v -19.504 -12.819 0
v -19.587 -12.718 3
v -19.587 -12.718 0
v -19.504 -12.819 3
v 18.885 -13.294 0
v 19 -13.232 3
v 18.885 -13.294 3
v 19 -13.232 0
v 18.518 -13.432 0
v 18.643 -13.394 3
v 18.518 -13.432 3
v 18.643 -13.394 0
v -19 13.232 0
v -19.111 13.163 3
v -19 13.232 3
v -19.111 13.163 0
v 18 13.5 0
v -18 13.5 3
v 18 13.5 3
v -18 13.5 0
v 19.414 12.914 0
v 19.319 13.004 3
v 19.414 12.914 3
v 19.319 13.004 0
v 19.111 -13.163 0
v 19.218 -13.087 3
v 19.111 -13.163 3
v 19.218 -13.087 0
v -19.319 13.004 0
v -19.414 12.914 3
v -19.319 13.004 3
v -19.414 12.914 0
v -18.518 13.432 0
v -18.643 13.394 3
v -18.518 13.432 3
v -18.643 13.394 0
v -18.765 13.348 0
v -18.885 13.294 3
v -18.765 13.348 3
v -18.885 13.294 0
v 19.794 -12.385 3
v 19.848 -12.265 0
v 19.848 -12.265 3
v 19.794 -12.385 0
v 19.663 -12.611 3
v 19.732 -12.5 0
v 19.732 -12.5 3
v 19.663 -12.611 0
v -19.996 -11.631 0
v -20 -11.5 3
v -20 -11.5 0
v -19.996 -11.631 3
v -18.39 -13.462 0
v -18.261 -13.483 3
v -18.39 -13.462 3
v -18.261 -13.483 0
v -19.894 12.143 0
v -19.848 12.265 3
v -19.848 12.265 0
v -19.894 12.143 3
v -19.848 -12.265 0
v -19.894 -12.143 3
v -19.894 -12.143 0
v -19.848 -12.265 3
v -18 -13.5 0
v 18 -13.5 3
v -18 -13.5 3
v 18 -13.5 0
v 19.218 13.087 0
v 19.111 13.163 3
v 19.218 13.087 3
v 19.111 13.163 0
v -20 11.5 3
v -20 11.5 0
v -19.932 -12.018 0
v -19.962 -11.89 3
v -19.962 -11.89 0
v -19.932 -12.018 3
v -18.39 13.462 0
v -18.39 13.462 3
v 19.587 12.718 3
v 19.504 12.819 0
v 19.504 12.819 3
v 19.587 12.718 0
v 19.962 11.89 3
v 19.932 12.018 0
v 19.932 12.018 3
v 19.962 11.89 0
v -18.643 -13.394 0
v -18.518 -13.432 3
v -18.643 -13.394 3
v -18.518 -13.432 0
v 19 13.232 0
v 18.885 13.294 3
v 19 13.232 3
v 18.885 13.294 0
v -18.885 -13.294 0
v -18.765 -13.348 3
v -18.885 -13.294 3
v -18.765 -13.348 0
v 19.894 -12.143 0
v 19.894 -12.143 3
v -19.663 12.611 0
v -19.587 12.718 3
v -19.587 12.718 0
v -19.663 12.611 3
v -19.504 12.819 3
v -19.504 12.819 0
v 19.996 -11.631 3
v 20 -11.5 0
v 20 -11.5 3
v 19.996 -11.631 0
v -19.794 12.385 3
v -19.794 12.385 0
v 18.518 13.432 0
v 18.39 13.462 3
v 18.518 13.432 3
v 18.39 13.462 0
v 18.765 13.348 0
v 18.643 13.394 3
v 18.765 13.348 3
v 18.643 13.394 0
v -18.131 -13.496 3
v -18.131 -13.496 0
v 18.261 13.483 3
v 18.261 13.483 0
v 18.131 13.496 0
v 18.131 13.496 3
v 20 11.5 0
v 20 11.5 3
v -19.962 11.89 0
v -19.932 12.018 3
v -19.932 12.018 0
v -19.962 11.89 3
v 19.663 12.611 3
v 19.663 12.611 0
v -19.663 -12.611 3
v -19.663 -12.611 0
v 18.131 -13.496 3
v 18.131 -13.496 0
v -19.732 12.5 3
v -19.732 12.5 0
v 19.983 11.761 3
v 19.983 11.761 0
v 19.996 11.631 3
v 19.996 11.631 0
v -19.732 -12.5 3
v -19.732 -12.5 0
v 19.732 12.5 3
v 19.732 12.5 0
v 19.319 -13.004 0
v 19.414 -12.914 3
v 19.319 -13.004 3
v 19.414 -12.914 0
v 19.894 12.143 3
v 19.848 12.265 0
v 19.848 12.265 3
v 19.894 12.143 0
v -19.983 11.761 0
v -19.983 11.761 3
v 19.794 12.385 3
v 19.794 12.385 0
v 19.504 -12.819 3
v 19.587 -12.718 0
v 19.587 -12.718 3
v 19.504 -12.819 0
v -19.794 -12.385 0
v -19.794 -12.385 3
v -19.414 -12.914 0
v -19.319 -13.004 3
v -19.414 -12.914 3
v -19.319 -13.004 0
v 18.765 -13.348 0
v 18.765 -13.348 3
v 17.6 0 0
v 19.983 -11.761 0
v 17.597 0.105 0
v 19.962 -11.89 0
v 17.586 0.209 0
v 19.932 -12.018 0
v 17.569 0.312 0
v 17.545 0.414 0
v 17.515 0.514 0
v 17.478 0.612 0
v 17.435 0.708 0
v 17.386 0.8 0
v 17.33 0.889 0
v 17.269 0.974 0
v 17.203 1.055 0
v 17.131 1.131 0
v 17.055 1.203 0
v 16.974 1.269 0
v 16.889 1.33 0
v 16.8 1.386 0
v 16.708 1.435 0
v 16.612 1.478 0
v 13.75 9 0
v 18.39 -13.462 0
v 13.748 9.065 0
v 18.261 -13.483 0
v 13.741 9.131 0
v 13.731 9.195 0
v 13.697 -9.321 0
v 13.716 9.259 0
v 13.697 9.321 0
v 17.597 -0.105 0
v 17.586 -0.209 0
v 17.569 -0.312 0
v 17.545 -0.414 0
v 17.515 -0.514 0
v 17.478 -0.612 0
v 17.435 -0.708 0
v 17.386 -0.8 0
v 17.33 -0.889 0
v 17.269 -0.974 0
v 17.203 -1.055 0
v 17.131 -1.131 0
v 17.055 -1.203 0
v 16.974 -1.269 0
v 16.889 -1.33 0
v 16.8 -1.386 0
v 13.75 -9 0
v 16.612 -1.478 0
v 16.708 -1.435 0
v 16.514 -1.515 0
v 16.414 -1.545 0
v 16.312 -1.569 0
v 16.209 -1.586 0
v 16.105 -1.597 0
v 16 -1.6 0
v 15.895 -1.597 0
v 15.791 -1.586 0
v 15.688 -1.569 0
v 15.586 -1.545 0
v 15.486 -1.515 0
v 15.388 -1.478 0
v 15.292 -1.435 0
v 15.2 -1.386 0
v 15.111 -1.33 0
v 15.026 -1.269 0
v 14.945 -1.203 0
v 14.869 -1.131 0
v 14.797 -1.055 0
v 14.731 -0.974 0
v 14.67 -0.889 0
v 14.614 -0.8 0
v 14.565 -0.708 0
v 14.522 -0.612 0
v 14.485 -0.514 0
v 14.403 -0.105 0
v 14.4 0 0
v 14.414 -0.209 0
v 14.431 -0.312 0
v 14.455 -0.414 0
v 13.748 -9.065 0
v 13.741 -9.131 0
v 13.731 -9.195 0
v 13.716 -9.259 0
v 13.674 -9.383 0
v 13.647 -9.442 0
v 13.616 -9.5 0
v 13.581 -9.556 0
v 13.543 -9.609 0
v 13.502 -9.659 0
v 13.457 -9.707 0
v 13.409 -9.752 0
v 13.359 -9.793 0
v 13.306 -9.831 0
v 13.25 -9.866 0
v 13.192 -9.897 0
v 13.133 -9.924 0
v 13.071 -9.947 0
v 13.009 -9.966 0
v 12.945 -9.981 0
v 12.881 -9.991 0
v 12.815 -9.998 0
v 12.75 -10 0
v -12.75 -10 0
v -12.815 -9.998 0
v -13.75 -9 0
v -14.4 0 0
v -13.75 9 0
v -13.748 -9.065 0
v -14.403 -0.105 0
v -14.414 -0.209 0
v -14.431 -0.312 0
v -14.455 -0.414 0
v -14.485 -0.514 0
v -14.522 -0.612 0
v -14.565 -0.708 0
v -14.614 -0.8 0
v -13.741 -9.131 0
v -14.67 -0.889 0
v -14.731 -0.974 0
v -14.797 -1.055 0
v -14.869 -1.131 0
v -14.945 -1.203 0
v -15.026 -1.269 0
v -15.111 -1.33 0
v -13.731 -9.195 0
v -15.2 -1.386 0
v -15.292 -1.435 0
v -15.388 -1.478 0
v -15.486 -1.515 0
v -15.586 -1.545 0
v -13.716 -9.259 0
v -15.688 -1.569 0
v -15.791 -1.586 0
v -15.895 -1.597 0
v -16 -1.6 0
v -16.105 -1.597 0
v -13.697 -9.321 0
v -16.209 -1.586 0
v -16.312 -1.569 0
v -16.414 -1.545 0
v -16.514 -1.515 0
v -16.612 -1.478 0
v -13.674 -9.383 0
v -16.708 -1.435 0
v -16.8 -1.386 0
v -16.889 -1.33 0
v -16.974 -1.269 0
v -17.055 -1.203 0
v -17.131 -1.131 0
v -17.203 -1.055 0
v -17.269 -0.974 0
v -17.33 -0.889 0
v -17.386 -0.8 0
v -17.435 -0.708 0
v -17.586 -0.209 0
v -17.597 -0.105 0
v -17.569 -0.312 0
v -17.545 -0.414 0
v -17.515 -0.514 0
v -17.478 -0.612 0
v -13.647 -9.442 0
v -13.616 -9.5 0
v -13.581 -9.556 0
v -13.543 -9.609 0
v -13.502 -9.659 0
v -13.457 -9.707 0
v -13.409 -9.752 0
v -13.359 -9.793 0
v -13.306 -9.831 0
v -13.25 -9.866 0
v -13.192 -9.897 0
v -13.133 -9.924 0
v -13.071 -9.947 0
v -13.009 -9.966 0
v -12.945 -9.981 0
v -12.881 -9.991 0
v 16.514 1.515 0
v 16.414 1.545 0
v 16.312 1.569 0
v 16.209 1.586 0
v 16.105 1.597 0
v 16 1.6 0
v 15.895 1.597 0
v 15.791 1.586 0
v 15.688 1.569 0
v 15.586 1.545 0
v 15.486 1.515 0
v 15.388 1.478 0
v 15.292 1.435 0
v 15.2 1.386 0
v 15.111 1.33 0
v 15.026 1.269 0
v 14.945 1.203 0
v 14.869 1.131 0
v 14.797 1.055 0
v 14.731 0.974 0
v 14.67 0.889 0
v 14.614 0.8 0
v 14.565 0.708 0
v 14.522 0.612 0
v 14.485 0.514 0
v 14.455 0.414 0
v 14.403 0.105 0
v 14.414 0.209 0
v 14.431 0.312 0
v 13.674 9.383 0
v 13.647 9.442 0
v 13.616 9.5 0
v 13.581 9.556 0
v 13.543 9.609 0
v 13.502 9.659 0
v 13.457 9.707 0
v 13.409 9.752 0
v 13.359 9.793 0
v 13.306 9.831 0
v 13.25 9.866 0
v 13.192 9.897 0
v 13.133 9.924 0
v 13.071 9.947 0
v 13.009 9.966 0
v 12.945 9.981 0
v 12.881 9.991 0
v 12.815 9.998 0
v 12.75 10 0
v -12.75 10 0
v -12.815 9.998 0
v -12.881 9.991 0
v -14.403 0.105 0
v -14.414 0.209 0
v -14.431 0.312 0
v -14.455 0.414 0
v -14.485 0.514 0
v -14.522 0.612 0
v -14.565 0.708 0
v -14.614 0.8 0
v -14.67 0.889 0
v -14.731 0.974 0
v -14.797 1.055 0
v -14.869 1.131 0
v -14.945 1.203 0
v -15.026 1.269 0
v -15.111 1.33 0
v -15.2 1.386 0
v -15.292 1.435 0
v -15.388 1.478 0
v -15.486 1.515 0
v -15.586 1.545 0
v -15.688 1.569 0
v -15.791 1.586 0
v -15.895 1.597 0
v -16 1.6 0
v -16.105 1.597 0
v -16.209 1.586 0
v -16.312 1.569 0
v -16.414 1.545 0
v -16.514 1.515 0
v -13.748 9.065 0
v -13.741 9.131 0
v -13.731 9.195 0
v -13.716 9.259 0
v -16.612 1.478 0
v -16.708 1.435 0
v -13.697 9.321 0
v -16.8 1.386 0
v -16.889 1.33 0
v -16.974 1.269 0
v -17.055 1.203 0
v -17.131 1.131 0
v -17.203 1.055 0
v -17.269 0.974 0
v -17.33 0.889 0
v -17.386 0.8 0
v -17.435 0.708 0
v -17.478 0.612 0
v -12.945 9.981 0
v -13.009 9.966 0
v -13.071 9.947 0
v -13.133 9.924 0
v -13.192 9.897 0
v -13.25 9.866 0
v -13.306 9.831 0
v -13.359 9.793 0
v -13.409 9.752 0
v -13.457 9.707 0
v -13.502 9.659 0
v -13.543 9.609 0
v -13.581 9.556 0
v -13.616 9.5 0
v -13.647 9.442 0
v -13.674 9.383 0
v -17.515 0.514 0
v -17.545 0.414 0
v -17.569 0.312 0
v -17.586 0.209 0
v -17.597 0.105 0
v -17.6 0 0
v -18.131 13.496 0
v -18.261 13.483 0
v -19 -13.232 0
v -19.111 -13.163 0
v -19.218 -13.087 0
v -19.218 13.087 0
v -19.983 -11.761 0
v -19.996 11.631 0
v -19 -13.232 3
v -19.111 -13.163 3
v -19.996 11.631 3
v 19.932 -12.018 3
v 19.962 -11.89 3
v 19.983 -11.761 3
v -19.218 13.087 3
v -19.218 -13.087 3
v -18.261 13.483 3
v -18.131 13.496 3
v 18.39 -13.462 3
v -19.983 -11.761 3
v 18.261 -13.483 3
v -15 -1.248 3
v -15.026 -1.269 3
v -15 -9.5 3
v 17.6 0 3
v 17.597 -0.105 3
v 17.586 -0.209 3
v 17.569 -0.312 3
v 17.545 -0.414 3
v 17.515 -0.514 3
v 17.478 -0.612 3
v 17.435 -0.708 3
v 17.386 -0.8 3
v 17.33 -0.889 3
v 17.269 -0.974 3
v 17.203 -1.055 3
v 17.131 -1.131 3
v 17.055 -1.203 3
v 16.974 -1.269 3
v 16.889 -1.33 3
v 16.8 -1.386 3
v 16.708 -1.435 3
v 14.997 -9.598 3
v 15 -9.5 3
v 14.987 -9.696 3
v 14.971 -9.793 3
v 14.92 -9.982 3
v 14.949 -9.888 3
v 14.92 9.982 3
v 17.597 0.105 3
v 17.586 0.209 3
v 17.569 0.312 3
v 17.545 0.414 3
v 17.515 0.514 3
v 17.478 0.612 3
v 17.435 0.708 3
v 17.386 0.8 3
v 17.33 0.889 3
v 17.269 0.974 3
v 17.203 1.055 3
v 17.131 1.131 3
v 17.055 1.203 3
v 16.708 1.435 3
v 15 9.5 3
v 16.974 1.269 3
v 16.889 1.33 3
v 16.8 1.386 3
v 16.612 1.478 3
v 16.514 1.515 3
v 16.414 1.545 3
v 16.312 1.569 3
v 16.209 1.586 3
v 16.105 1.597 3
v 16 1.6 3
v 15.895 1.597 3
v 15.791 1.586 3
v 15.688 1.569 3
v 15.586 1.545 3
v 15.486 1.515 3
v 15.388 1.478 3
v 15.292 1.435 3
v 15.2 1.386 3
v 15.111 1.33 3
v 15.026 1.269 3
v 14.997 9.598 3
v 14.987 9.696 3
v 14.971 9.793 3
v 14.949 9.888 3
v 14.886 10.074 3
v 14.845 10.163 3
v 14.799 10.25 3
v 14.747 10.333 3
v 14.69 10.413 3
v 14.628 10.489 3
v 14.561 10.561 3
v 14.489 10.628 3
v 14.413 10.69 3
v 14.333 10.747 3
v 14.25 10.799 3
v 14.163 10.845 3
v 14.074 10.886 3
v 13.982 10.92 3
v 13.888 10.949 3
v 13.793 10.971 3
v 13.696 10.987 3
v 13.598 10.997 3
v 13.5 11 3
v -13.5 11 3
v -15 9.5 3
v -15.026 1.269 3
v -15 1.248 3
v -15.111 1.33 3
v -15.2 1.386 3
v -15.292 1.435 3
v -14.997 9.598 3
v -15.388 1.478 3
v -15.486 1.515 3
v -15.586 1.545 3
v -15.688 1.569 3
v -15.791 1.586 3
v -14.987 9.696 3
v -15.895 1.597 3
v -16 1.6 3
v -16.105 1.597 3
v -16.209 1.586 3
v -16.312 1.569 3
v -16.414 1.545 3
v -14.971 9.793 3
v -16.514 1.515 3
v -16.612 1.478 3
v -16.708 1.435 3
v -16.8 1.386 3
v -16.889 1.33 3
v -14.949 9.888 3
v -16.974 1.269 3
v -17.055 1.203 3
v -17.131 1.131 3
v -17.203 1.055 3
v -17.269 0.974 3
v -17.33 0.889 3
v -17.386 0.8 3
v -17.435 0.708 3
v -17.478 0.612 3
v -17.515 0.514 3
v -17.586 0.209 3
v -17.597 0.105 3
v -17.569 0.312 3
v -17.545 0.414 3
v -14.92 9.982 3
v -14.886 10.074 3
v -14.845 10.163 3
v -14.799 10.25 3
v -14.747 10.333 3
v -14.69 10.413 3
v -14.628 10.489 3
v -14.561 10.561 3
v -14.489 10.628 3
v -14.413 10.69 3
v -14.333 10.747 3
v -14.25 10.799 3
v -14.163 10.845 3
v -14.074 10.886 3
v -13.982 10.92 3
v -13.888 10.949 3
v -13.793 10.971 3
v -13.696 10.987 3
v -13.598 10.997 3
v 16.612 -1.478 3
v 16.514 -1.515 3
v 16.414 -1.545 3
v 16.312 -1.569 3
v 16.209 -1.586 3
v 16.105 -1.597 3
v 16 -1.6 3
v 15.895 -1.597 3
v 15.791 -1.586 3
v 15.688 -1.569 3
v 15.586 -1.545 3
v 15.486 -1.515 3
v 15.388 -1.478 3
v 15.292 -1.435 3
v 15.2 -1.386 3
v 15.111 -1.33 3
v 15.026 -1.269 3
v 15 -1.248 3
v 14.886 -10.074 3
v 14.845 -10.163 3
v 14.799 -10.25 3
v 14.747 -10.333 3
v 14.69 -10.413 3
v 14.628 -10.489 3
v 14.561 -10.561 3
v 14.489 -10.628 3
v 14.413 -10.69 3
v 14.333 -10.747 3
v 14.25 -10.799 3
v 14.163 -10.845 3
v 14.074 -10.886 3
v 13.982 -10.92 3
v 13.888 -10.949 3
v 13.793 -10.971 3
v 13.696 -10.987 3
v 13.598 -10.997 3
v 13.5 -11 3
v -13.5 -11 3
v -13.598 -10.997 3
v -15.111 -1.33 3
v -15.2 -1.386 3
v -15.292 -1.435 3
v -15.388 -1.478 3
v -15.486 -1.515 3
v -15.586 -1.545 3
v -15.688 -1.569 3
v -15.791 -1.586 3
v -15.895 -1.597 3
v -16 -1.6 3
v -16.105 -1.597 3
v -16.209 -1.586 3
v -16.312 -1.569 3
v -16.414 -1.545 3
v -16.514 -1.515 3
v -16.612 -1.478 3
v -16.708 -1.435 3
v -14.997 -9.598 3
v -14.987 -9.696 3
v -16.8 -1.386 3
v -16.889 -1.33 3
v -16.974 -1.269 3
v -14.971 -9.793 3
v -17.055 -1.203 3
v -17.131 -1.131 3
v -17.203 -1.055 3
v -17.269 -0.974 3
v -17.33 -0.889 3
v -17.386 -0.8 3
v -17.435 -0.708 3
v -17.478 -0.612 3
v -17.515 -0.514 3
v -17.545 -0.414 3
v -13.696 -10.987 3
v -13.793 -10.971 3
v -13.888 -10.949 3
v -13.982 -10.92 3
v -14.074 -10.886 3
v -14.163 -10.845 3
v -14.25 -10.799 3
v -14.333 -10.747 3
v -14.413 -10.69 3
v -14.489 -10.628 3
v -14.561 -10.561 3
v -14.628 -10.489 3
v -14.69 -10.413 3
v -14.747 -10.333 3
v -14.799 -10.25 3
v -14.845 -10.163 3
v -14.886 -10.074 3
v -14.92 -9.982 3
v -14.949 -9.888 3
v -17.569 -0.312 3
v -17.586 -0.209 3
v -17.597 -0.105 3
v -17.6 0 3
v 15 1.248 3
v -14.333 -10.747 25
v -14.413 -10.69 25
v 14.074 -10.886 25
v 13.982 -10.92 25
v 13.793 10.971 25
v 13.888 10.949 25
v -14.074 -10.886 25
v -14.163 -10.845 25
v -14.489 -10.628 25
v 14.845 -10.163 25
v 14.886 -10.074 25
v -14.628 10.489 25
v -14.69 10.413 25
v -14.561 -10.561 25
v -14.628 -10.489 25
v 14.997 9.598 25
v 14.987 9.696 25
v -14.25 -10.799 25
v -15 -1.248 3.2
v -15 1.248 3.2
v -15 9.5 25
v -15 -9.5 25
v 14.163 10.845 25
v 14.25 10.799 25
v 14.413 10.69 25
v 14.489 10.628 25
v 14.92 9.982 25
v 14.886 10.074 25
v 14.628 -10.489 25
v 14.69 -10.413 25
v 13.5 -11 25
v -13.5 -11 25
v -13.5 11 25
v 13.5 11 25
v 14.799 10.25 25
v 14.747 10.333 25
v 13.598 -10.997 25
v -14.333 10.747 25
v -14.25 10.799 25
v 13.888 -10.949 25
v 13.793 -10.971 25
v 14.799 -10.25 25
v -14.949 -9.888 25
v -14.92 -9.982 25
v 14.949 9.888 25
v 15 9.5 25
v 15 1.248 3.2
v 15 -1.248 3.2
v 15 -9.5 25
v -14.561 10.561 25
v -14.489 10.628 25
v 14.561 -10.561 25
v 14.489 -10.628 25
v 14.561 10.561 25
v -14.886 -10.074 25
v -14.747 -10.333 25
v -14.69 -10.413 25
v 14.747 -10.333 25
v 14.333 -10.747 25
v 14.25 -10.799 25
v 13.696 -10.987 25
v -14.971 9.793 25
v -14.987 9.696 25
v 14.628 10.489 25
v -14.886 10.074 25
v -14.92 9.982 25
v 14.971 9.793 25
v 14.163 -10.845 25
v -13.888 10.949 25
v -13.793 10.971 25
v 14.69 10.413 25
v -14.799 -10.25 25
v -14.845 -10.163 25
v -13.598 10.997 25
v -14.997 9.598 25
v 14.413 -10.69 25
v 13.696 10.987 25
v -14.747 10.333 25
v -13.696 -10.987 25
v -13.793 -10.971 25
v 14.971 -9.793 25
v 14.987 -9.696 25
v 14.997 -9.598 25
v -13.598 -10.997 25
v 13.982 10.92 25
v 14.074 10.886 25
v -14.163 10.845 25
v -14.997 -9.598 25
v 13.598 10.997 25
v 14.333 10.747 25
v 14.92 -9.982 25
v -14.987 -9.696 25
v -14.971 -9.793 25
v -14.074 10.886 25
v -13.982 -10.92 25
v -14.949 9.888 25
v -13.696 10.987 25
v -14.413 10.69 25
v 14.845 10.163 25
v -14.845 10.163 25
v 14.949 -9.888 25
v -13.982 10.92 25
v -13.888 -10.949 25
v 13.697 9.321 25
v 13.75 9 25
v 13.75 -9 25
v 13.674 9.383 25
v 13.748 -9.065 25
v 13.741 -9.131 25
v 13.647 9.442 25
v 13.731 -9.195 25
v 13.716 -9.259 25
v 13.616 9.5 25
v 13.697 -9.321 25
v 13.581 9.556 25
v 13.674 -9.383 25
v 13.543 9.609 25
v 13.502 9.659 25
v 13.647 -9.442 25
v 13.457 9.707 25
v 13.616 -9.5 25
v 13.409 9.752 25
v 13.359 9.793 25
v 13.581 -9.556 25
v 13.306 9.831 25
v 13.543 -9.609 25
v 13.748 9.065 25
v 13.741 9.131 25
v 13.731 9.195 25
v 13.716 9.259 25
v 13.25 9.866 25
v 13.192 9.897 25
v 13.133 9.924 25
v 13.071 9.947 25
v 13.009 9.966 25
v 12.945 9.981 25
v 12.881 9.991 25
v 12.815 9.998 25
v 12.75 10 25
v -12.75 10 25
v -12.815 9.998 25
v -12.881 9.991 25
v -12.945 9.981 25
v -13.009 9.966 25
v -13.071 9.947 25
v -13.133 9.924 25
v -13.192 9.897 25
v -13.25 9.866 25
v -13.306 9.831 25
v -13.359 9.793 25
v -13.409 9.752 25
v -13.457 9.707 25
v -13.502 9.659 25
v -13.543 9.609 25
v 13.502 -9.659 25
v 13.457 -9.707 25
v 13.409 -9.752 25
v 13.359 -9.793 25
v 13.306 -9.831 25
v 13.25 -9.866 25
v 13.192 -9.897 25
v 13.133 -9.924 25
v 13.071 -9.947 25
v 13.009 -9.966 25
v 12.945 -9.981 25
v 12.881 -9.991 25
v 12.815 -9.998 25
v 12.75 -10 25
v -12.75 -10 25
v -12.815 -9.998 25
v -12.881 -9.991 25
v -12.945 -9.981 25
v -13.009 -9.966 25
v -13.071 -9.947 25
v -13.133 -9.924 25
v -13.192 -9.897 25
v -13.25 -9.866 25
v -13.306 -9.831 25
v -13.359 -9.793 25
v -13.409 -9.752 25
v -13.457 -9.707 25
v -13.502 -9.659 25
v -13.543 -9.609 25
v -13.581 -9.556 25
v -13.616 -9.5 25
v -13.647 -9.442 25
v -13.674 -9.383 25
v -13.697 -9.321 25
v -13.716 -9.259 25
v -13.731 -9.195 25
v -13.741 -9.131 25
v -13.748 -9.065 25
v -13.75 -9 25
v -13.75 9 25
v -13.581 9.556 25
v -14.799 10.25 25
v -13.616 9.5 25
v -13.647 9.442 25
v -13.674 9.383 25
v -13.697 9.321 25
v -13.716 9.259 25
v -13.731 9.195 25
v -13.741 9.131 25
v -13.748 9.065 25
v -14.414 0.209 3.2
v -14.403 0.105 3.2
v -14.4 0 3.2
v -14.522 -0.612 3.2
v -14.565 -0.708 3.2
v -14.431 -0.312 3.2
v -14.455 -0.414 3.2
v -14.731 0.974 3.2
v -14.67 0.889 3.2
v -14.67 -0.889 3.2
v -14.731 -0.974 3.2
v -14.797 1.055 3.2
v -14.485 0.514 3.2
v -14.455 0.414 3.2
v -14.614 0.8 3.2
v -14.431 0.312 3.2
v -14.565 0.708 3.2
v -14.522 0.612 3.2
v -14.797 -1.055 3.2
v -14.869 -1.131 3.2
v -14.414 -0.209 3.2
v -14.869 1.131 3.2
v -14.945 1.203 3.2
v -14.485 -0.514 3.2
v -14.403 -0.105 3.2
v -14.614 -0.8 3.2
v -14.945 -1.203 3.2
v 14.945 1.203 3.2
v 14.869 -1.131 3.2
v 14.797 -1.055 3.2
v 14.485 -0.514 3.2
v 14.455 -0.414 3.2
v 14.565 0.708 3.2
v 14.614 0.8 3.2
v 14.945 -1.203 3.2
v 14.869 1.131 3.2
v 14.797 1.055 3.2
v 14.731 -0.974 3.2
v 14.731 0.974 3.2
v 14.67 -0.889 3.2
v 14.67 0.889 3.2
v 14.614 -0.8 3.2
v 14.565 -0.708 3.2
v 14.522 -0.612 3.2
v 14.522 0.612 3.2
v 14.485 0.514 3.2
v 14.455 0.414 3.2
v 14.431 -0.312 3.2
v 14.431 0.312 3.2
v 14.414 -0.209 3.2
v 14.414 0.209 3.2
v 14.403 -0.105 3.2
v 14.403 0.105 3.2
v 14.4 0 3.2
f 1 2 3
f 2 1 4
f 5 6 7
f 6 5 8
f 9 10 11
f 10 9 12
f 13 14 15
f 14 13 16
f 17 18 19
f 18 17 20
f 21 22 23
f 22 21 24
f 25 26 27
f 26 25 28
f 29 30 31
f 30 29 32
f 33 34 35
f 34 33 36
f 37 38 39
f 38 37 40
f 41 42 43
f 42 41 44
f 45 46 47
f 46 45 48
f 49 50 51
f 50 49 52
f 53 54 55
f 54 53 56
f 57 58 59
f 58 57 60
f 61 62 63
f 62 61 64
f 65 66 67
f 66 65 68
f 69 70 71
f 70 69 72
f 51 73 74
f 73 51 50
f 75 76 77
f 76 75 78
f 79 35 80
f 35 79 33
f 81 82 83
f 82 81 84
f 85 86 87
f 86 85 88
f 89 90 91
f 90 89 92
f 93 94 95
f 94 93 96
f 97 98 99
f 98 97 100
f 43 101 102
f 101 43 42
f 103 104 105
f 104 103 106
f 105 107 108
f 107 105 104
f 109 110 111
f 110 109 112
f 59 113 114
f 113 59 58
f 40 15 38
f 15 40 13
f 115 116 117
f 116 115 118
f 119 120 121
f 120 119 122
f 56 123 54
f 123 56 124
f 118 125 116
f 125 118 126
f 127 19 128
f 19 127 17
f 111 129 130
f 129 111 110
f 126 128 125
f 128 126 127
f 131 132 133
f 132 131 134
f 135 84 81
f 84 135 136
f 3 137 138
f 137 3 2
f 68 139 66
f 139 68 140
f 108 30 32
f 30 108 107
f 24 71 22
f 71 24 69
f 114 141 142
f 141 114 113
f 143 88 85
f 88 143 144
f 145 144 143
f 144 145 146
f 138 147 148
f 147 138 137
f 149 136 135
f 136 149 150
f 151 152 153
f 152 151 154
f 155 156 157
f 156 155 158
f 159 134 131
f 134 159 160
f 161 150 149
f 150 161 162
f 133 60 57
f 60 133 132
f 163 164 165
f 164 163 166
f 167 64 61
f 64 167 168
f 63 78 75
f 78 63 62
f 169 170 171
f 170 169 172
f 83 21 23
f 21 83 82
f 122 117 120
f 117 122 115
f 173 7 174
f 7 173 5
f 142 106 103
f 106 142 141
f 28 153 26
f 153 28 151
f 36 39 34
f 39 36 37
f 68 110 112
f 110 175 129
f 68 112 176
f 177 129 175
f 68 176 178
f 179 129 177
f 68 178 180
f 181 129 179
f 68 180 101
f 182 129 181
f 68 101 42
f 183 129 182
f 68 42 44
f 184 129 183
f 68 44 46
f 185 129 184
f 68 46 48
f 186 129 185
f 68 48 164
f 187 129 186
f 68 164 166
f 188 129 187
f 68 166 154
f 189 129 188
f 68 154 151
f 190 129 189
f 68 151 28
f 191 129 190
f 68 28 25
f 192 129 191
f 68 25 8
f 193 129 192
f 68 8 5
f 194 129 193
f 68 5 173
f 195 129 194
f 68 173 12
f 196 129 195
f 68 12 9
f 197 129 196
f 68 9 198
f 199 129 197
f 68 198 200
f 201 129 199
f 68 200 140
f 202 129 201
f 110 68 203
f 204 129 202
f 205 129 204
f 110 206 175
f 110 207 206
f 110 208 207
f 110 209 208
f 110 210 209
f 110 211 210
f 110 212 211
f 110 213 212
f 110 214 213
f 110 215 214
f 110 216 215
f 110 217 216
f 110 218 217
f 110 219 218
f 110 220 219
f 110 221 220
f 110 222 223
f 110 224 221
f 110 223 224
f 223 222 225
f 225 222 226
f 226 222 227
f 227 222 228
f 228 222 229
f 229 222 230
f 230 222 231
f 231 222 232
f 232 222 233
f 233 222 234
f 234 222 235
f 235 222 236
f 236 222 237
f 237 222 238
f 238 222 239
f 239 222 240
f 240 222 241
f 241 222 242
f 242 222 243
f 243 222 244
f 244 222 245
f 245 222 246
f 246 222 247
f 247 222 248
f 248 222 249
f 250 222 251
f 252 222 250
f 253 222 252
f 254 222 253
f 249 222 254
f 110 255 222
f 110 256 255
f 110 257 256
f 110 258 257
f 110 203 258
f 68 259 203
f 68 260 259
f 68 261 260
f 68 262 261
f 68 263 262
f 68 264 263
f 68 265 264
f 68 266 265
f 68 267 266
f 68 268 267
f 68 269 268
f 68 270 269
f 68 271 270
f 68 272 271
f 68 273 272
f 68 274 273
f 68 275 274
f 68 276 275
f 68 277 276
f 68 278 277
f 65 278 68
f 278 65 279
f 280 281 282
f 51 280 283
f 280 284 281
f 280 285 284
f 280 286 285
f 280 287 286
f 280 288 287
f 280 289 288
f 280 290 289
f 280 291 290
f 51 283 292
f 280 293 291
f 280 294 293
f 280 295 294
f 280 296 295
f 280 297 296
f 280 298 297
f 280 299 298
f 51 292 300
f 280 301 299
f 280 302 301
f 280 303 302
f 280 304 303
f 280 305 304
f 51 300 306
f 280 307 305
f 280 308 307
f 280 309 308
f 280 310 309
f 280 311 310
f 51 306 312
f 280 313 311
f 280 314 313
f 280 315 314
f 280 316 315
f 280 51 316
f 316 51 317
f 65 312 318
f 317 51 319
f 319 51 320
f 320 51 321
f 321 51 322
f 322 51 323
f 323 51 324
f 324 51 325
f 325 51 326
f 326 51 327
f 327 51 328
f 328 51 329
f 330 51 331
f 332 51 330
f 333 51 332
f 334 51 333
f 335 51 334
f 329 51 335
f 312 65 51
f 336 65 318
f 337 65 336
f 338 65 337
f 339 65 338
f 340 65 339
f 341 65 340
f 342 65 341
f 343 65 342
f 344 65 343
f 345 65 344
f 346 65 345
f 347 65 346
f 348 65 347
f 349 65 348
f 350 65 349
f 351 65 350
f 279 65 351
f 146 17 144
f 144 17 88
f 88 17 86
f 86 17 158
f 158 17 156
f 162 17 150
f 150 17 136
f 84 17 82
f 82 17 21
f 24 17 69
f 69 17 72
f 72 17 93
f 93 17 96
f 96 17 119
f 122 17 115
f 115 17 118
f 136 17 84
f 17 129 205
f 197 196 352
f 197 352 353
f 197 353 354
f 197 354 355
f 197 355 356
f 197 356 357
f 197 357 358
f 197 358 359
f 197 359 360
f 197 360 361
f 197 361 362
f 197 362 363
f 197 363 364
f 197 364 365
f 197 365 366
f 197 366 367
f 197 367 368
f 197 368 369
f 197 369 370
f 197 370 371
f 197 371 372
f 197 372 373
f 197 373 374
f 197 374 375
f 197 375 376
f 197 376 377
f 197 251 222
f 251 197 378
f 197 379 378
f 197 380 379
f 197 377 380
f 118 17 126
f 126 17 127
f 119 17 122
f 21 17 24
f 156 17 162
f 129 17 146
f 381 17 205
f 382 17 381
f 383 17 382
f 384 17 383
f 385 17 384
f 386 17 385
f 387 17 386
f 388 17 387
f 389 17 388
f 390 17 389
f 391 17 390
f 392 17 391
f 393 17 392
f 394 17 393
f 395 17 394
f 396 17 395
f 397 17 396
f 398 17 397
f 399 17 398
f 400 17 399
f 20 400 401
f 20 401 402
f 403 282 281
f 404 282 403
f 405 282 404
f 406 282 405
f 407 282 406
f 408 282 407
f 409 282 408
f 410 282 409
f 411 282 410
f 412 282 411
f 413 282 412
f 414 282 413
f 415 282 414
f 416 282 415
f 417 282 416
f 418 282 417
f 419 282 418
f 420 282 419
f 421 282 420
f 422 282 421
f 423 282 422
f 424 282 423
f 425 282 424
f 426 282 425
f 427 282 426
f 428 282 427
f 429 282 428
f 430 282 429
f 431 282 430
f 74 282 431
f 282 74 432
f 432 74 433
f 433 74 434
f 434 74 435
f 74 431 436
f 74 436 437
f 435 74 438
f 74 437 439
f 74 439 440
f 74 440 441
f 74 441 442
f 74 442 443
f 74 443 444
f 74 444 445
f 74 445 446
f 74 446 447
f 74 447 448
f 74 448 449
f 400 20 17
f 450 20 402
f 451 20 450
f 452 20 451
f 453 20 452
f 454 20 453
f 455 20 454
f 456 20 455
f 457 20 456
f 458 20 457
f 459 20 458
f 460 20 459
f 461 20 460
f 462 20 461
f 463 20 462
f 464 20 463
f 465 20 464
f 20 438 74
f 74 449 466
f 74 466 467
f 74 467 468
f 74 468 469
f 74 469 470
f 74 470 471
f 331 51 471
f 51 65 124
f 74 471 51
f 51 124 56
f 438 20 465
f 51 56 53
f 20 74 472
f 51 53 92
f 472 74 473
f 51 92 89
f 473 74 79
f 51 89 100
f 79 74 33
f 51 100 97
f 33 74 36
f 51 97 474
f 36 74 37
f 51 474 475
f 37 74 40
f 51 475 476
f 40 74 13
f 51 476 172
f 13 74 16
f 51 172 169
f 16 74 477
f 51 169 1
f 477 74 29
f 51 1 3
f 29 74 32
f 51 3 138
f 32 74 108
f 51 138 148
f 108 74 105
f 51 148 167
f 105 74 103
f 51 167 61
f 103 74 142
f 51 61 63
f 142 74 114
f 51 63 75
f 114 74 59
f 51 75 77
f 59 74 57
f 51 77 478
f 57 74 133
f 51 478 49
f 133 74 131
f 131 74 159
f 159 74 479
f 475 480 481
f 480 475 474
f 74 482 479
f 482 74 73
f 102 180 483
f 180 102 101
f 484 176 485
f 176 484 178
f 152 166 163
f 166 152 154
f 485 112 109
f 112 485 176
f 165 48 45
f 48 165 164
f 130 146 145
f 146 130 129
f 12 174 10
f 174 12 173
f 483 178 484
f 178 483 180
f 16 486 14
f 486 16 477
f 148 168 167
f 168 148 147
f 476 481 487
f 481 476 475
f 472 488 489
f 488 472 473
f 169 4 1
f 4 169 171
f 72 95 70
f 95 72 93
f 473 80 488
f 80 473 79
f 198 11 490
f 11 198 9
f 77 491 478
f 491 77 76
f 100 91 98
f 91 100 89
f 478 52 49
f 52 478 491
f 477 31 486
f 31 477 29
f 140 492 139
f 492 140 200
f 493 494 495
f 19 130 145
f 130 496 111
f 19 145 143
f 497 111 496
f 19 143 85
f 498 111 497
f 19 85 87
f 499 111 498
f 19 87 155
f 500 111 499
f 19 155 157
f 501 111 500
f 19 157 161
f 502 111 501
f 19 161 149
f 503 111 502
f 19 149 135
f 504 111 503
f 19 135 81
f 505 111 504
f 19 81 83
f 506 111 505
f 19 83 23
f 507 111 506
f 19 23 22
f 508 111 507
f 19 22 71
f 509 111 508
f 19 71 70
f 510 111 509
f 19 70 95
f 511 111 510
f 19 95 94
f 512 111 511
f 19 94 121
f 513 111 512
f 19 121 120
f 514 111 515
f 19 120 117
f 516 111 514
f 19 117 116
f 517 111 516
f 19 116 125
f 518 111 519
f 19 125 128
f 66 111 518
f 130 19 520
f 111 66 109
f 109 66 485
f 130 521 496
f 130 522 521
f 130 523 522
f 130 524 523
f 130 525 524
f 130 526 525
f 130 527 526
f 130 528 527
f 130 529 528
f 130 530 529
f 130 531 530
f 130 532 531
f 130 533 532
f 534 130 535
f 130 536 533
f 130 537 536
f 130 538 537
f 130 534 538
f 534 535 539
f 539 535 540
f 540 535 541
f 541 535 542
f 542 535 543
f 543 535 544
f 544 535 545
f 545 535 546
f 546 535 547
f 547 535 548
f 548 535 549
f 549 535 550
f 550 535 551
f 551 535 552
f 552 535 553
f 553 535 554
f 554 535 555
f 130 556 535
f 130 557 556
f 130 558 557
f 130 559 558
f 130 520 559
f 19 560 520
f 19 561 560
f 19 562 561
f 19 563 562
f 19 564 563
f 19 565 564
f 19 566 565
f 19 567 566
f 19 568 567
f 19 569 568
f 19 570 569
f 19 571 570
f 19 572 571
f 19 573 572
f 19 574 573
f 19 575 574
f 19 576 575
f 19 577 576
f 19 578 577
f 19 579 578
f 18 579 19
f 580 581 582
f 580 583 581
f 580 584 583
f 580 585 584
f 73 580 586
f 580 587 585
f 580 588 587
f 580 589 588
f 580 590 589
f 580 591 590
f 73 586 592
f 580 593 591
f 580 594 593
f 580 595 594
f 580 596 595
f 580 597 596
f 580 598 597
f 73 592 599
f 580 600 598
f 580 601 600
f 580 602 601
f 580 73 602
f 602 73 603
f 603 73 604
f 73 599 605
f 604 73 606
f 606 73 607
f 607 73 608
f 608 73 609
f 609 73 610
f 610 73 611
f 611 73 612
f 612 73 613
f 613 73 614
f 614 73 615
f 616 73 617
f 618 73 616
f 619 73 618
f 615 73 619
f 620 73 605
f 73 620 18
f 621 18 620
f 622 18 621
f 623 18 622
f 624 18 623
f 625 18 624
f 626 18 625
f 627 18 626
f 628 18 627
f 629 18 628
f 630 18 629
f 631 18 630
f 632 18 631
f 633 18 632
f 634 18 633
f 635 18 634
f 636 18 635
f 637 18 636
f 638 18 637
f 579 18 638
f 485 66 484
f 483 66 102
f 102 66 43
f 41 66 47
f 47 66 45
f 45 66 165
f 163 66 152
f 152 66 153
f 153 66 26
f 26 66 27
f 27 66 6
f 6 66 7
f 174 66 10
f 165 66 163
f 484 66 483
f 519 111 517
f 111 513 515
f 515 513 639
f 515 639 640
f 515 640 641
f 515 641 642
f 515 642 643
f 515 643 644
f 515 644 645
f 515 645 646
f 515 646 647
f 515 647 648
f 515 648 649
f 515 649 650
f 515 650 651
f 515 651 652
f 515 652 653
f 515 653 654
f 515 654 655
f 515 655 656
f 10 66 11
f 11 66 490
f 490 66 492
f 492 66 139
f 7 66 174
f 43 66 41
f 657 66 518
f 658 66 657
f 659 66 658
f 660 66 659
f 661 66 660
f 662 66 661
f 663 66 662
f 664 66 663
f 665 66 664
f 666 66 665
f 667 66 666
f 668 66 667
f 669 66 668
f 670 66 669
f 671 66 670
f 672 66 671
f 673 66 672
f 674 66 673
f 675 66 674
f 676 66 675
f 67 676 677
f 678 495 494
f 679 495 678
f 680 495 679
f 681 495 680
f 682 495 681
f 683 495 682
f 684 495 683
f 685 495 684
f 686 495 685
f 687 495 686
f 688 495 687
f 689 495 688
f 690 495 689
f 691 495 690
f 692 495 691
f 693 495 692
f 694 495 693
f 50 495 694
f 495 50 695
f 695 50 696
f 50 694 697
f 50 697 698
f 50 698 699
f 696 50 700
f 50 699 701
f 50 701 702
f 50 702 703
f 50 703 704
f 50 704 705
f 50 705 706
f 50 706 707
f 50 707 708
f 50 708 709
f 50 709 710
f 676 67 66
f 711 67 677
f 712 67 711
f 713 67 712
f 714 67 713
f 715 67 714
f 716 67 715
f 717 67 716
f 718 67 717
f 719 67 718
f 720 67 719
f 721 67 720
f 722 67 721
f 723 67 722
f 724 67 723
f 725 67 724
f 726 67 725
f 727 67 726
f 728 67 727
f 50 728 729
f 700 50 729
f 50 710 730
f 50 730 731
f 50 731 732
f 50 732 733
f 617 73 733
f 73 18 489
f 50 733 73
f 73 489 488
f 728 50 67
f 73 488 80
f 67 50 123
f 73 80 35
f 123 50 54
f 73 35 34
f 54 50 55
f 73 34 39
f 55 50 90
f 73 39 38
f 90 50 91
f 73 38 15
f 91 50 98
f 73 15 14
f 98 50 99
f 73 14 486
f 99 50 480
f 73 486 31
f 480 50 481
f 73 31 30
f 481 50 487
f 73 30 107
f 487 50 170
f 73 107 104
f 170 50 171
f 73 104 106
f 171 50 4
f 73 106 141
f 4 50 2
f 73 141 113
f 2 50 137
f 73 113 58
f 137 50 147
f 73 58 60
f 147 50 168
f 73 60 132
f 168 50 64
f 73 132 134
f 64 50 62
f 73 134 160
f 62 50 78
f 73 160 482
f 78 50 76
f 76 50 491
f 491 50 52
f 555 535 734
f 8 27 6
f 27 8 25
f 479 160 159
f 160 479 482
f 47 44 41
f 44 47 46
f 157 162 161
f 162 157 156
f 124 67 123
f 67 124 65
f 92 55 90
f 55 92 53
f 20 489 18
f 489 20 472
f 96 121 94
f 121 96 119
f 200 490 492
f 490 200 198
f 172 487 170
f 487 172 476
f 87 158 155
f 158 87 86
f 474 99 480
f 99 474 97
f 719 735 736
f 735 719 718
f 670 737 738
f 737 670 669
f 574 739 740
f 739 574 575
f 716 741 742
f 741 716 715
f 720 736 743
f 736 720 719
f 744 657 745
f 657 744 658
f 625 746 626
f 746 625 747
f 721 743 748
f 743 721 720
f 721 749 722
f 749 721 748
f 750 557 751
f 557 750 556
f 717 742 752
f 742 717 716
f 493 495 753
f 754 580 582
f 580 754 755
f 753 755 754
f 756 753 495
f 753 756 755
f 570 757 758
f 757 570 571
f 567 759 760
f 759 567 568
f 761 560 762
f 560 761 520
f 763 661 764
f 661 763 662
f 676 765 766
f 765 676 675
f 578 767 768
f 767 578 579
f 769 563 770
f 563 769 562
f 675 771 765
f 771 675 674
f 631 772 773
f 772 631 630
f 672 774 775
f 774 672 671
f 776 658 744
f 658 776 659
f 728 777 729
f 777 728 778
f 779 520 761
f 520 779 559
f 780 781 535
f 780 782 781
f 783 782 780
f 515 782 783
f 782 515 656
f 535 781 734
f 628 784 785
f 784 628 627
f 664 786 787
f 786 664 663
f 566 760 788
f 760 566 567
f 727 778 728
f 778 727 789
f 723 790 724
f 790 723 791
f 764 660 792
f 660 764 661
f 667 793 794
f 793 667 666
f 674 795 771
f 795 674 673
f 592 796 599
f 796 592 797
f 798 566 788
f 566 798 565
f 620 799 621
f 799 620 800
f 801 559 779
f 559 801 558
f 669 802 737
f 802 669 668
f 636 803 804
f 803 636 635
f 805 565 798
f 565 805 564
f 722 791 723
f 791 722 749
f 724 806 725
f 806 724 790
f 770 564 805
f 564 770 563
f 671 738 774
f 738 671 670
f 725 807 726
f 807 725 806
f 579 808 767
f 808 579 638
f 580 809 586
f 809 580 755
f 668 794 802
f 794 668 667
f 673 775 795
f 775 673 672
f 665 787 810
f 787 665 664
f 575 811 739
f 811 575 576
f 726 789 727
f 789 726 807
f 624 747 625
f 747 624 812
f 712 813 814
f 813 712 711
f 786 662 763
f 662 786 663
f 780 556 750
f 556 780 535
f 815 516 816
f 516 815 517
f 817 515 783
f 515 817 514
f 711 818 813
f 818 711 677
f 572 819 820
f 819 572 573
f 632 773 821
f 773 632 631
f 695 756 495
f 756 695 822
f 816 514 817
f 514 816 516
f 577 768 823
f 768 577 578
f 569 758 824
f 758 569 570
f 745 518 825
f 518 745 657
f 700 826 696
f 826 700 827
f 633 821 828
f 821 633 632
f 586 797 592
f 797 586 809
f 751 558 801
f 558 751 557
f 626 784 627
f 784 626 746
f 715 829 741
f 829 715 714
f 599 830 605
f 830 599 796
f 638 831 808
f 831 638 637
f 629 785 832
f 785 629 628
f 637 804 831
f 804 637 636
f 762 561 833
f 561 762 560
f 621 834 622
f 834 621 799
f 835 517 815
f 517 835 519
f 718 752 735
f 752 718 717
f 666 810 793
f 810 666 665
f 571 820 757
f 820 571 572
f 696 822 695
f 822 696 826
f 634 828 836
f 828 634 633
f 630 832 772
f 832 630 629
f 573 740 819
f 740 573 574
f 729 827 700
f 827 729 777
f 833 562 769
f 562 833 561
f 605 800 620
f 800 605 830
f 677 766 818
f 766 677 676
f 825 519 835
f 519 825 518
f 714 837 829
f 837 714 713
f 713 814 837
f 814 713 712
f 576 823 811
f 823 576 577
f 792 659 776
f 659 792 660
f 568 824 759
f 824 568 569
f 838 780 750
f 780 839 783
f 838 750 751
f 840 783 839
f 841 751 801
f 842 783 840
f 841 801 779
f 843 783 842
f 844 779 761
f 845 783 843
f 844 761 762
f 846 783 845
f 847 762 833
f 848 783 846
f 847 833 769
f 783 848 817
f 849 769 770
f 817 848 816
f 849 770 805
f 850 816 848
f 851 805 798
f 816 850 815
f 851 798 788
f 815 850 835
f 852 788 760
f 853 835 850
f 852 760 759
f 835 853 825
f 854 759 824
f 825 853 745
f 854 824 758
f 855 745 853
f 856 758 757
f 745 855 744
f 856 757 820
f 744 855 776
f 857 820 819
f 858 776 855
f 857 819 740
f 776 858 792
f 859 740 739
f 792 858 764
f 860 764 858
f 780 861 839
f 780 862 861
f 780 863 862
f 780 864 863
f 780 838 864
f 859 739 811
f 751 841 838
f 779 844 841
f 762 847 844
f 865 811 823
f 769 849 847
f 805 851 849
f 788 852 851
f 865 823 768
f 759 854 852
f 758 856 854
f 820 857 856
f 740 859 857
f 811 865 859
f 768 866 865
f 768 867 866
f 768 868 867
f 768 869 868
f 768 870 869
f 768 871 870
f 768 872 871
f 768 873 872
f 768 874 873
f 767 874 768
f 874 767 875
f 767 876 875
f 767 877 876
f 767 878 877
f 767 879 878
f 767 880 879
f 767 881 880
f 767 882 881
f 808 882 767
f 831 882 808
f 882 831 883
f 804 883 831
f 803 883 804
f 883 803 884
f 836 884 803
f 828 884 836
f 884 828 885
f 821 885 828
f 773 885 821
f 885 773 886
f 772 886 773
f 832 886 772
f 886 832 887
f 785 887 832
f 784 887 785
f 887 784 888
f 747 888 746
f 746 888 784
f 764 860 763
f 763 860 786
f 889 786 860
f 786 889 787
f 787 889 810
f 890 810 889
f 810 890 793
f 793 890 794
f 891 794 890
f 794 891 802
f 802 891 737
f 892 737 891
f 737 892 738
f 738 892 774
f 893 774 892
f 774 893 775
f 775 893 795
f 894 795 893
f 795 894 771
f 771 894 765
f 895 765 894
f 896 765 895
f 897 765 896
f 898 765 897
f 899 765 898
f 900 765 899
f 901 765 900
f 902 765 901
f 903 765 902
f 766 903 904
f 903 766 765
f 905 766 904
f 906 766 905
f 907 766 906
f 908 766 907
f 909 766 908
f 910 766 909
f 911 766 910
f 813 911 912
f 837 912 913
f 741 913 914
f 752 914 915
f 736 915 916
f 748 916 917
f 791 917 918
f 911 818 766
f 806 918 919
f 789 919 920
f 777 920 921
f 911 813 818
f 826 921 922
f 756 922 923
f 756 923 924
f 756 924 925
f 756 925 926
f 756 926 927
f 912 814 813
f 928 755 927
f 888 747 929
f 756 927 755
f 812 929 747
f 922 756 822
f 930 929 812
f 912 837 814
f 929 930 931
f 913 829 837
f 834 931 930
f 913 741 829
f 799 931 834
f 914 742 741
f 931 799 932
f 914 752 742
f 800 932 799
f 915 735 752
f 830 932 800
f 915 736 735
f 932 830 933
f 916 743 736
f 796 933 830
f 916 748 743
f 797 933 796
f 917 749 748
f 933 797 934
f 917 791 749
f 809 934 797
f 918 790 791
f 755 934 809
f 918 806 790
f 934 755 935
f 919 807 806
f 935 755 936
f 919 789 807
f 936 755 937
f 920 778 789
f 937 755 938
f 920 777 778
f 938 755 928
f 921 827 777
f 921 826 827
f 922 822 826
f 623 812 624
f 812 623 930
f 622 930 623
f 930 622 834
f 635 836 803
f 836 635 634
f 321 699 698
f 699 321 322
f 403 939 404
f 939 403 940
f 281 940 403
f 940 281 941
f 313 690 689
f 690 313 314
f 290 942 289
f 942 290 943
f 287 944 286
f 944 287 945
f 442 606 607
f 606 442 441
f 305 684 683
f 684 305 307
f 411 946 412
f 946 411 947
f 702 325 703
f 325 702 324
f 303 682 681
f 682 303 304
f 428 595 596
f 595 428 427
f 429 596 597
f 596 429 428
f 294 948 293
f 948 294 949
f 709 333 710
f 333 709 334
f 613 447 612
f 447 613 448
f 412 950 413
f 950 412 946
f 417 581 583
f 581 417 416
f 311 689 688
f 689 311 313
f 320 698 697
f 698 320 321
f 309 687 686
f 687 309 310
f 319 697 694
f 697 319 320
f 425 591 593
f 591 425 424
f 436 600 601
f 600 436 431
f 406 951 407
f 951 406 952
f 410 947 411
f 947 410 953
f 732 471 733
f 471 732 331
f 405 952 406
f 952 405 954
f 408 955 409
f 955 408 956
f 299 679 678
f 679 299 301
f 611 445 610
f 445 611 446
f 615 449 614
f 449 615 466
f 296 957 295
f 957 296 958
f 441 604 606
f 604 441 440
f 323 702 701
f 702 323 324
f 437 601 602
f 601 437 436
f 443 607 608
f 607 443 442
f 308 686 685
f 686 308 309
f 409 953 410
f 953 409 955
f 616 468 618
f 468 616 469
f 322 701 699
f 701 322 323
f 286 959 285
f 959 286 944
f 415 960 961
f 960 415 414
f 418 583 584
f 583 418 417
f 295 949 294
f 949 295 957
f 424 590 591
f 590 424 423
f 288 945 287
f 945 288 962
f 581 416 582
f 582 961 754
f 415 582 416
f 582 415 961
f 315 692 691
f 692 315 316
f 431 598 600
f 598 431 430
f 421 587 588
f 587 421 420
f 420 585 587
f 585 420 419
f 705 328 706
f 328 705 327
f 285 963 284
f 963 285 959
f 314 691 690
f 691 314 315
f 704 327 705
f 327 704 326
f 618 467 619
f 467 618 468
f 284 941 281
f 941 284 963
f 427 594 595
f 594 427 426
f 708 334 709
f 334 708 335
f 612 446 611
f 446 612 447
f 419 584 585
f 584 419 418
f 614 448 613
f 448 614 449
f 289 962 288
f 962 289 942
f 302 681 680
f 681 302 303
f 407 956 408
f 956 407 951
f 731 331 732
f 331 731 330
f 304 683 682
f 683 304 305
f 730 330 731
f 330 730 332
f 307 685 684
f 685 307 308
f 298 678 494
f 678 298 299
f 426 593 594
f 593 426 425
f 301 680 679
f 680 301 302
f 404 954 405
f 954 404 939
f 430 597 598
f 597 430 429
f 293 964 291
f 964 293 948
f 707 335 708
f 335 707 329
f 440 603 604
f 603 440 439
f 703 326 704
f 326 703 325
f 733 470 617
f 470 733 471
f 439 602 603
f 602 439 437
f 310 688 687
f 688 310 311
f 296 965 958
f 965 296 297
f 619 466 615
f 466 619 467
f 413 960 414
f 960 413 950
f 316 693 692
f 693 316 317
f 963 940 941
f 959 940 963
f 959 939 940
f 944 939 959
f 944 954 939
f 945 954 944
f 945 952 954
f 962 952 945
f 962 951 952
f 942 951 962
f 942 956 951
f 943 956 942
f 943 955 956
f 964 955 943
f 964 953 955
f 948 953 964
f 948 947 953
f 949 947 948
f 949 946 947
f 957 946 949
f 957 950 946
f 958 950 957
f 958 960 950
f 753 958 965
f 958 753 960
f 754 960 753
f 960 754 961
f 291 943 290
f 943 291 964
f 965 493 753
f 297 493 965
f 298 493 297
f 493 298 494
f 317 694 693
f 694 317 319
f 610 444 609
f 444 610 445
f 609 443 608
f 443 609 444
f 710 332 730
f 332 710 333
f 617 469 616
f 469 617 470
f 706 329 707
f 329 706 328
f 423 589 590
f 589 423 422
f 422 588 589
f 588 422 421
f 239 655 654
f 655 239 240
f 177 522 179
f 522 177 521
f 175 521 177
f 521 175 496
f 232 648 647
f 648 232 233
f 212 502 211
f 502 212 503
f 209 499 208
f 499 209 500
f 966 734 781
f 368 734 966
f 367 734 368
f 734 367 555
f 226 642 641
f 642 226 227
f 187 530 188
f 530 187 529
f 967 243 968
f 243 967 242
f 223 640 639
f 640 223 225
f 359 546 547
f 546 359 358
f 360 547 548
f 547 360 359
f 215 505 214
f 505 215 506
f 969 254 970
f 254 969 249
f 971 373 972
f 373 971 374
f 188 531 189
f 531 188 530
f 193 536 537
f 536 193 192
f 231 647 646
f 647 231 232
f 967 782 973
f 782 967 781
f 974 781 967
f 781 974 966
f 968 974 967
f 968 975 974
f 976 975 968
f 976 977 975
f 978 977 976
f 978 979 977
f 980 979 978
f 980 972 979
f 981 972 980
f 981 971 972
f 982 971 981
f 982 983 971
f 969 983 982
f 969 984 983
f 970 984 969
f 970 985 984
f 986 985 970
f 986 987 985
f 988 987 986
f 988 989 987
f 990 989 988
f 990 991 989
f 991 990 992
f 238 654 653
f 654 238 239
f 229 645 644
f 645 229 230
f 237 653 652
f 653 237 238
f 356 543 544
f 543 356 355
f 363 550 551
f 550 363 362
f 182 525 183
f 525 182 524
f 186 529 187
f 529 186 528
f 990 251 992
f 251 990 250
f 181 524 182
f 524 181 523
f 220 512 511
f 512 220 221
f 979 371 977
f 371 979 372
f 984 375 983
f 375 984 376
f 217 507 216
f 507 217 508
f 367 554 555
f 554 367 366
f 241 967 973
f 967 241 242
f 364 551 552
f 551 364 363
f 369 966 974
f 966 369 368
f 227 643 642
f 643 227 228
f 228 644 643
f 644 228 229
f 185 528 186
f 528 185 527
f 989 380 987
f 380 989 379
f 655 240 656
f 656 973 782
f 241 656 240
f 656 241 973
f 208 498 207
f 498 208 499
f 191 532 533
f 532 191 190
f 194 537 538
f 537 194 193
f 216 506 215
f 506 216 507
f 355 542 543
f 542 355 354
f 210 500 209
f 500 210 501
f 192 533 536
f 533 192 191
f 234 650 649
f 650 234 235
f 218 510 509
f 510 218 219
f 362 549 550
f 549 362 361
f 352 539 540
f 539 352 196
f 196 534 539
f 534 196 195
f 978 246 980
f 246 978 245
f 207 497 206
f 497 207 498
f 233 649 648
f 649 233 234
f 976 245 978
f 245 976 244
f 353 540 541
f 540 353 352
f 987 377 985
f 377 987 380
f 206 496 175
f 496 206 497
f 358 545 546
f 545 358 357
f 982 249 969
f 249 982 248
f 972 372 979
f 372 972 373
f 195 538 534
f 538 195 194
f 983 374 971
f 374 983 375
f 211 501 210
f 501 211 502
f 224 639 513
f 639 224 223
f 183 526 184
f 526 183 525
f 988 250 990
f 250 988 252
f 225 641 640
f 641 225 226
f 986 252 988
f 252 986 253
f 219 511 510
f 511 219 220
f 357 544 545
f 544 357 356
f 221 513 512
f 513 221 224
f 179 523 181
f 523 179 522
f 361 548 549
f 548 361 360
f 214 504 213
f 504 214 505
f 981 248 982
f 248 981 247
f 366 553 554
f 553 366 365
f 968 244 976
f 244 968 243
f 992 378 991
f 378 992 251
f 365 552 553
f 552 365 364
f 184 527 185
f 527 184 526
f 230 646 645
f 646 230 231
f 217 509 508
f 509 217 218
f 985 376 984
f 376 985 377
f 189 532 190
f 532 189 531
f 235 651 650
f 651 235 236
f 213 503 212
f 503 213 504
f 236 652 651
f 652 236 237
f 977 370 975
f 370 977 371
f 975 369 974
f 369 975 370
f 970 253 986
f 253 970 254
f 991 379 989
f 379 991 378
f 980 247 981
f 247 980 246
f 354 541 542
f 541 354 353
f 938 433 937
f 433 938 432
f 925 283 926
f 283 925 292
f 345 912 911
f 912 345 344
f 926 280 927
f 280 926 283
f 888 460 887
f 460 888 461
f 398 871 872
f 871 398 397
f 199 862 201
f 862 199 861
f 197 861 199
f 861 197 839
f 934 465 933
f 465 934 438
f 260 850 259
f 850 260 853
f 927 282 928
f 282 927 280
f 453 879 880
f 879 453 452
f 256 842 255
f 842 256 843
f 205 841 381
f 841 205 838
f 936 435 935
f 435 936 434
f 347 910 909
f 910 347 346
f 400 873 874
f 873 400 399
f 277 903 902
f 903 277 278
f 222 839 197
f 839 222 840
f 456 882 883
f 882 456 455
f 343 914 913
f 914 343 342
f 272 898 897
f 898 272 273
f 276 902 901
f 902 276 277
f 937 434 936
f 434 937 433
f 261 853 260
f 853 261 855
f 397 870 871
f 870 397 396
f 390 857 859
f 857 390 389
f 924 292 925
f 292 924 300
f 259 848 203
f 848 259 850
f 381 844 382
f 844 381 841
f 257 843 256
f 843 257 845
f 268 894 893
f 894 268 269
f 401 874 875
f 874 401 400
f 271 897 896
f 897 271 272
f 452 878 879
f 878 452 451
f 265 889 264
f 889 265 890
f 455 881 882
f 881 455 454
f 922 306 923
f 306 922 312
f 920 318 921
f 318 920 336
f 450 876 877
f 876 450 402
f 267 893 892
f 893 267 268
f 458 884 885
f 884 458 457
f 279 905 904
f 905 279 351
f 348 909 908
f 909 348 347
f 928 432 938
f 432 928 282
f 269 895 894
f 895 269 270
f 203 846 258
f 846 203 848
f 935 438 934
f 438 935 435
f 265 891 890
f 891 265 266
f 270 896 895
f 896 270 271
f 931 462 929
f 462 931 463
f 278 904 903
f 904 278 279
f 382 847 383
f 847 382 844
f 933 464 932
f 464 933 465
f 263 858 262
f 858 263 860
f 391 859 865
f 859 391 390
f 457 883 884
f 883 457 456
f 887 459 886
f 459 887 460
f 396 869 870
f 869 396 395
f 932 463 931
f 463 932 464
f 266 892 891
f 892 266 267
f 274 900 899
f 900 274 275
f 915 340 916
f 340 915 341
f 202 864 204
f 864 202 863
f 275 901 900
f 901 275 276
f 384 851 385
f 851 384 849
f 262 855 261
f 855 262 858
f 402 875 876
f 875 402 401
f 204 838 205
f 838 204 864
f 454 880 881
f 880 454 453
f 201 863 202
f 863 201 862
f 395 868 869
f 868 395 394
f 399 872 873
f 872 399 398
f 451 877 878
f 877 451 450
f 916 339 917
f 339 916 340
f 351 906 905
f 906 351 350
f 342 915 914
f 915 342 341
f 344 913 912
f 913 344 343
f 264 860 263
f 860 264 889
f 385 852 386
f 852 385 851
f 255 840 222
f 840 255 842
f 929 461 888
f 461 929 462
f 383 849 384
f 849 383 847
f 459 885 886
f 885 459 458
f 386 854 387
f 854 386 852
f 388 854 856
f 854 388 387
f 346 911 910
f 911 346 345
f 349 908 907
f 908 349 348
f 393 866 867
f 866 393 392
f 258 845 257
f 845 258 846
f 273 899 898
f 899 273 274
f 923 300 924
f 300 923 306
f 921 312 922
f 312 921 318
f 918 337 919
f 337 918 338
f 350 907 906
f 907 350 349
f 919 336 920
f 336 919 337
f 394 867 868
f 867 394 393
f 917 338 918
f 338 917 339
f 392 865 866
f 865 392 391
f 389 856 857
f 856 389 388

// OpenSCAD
$fn=96;

// IEC C14 inlet module (panel-mount style) nominal outer size 40 x 27 mm
// This is a simplified, renderable model suitable for enclosure layout.
// Units: mm

module iec_c14_inlet_module(
    outer_w=40.0,
    outer_h=27.0,
    flange_t=3.0,
    body_depth=22.0,
    body_w=30.0,
    body_h=22.0,
    corner_r=2.0,

    // Panel cutout (typical-ish for C14): ~27.5 x 20.0
    cutout_w=27.5,
    cutout_h=20.0,

    // Screw ears / holes (common on fused/switch modules; kept generic)
    ear_w=6.0,
    ear_h=10.0,
    hole_d=3.2,
    hole_offset_x=16.0,   // from center to hole along X
    hole_offset_y=0.0
){
    difference() {
        union() {
            // Front flange plate with rounded corners
            linear_extrude(height=flange_t)
                rounded_rect(outer_w, outer_h, corner_r);

            // Rear body (rectangular) centered behind flange
            translate([0,0,flange_t])
                linear_extrude(height=body_depth)
                    rounded_rect(body_w, body_h, 1.5);

            // Optional small ears integrated into flange (left/right)
            // (kept subtle; holes still provided)
            translate([0,0,0])
                linear_extrude(height=flange_t)
                    union() {
                        translate([ outer_w/2 - ear_w/2, 0, 0]) rounded_rect(ear_w, ear_h, 1.0);
                        translate([-outer_w/2 + ear_w/2, 0, 0]) rounded_rect(ear_w, ear_h, 1.0);
                    }
        }

        // Panel cutout opening through flange and into body
        translate([0,0,-0.1])
            linear_extrude(height=flange_t + body_depth + 0.2)
                rounded_rect(cutout_w, cutout_h, 1.0);

        // Screw holes through flange
        for (sx = [-1, 1]) {
            translate([sx*hole_offset_x, hole_offset_y, -0.2])
                cylinder(d=hole_d, h=flange_t + 0.4);
        }

        // Slight rear relief to suggest connector cavity (optional)
        translate([0,0,flange_t + 2])
            linear_extrude(height=body_depth - 4)
                rounded_rect(body_w-4, body_h-4, 1.0);
    }
}

module rounded_rect(w,h,r){
    r2 = min(r, min(w,h)/2);
    hull() {
        for (x=[-w/2 + r2, w/2 - r2])
            for (y=[-h/2 + r2, h/2 - r2])
                translate([x,y]) circle(r=r2);
    }
}

// Render
iec_c14_inlet_module();
